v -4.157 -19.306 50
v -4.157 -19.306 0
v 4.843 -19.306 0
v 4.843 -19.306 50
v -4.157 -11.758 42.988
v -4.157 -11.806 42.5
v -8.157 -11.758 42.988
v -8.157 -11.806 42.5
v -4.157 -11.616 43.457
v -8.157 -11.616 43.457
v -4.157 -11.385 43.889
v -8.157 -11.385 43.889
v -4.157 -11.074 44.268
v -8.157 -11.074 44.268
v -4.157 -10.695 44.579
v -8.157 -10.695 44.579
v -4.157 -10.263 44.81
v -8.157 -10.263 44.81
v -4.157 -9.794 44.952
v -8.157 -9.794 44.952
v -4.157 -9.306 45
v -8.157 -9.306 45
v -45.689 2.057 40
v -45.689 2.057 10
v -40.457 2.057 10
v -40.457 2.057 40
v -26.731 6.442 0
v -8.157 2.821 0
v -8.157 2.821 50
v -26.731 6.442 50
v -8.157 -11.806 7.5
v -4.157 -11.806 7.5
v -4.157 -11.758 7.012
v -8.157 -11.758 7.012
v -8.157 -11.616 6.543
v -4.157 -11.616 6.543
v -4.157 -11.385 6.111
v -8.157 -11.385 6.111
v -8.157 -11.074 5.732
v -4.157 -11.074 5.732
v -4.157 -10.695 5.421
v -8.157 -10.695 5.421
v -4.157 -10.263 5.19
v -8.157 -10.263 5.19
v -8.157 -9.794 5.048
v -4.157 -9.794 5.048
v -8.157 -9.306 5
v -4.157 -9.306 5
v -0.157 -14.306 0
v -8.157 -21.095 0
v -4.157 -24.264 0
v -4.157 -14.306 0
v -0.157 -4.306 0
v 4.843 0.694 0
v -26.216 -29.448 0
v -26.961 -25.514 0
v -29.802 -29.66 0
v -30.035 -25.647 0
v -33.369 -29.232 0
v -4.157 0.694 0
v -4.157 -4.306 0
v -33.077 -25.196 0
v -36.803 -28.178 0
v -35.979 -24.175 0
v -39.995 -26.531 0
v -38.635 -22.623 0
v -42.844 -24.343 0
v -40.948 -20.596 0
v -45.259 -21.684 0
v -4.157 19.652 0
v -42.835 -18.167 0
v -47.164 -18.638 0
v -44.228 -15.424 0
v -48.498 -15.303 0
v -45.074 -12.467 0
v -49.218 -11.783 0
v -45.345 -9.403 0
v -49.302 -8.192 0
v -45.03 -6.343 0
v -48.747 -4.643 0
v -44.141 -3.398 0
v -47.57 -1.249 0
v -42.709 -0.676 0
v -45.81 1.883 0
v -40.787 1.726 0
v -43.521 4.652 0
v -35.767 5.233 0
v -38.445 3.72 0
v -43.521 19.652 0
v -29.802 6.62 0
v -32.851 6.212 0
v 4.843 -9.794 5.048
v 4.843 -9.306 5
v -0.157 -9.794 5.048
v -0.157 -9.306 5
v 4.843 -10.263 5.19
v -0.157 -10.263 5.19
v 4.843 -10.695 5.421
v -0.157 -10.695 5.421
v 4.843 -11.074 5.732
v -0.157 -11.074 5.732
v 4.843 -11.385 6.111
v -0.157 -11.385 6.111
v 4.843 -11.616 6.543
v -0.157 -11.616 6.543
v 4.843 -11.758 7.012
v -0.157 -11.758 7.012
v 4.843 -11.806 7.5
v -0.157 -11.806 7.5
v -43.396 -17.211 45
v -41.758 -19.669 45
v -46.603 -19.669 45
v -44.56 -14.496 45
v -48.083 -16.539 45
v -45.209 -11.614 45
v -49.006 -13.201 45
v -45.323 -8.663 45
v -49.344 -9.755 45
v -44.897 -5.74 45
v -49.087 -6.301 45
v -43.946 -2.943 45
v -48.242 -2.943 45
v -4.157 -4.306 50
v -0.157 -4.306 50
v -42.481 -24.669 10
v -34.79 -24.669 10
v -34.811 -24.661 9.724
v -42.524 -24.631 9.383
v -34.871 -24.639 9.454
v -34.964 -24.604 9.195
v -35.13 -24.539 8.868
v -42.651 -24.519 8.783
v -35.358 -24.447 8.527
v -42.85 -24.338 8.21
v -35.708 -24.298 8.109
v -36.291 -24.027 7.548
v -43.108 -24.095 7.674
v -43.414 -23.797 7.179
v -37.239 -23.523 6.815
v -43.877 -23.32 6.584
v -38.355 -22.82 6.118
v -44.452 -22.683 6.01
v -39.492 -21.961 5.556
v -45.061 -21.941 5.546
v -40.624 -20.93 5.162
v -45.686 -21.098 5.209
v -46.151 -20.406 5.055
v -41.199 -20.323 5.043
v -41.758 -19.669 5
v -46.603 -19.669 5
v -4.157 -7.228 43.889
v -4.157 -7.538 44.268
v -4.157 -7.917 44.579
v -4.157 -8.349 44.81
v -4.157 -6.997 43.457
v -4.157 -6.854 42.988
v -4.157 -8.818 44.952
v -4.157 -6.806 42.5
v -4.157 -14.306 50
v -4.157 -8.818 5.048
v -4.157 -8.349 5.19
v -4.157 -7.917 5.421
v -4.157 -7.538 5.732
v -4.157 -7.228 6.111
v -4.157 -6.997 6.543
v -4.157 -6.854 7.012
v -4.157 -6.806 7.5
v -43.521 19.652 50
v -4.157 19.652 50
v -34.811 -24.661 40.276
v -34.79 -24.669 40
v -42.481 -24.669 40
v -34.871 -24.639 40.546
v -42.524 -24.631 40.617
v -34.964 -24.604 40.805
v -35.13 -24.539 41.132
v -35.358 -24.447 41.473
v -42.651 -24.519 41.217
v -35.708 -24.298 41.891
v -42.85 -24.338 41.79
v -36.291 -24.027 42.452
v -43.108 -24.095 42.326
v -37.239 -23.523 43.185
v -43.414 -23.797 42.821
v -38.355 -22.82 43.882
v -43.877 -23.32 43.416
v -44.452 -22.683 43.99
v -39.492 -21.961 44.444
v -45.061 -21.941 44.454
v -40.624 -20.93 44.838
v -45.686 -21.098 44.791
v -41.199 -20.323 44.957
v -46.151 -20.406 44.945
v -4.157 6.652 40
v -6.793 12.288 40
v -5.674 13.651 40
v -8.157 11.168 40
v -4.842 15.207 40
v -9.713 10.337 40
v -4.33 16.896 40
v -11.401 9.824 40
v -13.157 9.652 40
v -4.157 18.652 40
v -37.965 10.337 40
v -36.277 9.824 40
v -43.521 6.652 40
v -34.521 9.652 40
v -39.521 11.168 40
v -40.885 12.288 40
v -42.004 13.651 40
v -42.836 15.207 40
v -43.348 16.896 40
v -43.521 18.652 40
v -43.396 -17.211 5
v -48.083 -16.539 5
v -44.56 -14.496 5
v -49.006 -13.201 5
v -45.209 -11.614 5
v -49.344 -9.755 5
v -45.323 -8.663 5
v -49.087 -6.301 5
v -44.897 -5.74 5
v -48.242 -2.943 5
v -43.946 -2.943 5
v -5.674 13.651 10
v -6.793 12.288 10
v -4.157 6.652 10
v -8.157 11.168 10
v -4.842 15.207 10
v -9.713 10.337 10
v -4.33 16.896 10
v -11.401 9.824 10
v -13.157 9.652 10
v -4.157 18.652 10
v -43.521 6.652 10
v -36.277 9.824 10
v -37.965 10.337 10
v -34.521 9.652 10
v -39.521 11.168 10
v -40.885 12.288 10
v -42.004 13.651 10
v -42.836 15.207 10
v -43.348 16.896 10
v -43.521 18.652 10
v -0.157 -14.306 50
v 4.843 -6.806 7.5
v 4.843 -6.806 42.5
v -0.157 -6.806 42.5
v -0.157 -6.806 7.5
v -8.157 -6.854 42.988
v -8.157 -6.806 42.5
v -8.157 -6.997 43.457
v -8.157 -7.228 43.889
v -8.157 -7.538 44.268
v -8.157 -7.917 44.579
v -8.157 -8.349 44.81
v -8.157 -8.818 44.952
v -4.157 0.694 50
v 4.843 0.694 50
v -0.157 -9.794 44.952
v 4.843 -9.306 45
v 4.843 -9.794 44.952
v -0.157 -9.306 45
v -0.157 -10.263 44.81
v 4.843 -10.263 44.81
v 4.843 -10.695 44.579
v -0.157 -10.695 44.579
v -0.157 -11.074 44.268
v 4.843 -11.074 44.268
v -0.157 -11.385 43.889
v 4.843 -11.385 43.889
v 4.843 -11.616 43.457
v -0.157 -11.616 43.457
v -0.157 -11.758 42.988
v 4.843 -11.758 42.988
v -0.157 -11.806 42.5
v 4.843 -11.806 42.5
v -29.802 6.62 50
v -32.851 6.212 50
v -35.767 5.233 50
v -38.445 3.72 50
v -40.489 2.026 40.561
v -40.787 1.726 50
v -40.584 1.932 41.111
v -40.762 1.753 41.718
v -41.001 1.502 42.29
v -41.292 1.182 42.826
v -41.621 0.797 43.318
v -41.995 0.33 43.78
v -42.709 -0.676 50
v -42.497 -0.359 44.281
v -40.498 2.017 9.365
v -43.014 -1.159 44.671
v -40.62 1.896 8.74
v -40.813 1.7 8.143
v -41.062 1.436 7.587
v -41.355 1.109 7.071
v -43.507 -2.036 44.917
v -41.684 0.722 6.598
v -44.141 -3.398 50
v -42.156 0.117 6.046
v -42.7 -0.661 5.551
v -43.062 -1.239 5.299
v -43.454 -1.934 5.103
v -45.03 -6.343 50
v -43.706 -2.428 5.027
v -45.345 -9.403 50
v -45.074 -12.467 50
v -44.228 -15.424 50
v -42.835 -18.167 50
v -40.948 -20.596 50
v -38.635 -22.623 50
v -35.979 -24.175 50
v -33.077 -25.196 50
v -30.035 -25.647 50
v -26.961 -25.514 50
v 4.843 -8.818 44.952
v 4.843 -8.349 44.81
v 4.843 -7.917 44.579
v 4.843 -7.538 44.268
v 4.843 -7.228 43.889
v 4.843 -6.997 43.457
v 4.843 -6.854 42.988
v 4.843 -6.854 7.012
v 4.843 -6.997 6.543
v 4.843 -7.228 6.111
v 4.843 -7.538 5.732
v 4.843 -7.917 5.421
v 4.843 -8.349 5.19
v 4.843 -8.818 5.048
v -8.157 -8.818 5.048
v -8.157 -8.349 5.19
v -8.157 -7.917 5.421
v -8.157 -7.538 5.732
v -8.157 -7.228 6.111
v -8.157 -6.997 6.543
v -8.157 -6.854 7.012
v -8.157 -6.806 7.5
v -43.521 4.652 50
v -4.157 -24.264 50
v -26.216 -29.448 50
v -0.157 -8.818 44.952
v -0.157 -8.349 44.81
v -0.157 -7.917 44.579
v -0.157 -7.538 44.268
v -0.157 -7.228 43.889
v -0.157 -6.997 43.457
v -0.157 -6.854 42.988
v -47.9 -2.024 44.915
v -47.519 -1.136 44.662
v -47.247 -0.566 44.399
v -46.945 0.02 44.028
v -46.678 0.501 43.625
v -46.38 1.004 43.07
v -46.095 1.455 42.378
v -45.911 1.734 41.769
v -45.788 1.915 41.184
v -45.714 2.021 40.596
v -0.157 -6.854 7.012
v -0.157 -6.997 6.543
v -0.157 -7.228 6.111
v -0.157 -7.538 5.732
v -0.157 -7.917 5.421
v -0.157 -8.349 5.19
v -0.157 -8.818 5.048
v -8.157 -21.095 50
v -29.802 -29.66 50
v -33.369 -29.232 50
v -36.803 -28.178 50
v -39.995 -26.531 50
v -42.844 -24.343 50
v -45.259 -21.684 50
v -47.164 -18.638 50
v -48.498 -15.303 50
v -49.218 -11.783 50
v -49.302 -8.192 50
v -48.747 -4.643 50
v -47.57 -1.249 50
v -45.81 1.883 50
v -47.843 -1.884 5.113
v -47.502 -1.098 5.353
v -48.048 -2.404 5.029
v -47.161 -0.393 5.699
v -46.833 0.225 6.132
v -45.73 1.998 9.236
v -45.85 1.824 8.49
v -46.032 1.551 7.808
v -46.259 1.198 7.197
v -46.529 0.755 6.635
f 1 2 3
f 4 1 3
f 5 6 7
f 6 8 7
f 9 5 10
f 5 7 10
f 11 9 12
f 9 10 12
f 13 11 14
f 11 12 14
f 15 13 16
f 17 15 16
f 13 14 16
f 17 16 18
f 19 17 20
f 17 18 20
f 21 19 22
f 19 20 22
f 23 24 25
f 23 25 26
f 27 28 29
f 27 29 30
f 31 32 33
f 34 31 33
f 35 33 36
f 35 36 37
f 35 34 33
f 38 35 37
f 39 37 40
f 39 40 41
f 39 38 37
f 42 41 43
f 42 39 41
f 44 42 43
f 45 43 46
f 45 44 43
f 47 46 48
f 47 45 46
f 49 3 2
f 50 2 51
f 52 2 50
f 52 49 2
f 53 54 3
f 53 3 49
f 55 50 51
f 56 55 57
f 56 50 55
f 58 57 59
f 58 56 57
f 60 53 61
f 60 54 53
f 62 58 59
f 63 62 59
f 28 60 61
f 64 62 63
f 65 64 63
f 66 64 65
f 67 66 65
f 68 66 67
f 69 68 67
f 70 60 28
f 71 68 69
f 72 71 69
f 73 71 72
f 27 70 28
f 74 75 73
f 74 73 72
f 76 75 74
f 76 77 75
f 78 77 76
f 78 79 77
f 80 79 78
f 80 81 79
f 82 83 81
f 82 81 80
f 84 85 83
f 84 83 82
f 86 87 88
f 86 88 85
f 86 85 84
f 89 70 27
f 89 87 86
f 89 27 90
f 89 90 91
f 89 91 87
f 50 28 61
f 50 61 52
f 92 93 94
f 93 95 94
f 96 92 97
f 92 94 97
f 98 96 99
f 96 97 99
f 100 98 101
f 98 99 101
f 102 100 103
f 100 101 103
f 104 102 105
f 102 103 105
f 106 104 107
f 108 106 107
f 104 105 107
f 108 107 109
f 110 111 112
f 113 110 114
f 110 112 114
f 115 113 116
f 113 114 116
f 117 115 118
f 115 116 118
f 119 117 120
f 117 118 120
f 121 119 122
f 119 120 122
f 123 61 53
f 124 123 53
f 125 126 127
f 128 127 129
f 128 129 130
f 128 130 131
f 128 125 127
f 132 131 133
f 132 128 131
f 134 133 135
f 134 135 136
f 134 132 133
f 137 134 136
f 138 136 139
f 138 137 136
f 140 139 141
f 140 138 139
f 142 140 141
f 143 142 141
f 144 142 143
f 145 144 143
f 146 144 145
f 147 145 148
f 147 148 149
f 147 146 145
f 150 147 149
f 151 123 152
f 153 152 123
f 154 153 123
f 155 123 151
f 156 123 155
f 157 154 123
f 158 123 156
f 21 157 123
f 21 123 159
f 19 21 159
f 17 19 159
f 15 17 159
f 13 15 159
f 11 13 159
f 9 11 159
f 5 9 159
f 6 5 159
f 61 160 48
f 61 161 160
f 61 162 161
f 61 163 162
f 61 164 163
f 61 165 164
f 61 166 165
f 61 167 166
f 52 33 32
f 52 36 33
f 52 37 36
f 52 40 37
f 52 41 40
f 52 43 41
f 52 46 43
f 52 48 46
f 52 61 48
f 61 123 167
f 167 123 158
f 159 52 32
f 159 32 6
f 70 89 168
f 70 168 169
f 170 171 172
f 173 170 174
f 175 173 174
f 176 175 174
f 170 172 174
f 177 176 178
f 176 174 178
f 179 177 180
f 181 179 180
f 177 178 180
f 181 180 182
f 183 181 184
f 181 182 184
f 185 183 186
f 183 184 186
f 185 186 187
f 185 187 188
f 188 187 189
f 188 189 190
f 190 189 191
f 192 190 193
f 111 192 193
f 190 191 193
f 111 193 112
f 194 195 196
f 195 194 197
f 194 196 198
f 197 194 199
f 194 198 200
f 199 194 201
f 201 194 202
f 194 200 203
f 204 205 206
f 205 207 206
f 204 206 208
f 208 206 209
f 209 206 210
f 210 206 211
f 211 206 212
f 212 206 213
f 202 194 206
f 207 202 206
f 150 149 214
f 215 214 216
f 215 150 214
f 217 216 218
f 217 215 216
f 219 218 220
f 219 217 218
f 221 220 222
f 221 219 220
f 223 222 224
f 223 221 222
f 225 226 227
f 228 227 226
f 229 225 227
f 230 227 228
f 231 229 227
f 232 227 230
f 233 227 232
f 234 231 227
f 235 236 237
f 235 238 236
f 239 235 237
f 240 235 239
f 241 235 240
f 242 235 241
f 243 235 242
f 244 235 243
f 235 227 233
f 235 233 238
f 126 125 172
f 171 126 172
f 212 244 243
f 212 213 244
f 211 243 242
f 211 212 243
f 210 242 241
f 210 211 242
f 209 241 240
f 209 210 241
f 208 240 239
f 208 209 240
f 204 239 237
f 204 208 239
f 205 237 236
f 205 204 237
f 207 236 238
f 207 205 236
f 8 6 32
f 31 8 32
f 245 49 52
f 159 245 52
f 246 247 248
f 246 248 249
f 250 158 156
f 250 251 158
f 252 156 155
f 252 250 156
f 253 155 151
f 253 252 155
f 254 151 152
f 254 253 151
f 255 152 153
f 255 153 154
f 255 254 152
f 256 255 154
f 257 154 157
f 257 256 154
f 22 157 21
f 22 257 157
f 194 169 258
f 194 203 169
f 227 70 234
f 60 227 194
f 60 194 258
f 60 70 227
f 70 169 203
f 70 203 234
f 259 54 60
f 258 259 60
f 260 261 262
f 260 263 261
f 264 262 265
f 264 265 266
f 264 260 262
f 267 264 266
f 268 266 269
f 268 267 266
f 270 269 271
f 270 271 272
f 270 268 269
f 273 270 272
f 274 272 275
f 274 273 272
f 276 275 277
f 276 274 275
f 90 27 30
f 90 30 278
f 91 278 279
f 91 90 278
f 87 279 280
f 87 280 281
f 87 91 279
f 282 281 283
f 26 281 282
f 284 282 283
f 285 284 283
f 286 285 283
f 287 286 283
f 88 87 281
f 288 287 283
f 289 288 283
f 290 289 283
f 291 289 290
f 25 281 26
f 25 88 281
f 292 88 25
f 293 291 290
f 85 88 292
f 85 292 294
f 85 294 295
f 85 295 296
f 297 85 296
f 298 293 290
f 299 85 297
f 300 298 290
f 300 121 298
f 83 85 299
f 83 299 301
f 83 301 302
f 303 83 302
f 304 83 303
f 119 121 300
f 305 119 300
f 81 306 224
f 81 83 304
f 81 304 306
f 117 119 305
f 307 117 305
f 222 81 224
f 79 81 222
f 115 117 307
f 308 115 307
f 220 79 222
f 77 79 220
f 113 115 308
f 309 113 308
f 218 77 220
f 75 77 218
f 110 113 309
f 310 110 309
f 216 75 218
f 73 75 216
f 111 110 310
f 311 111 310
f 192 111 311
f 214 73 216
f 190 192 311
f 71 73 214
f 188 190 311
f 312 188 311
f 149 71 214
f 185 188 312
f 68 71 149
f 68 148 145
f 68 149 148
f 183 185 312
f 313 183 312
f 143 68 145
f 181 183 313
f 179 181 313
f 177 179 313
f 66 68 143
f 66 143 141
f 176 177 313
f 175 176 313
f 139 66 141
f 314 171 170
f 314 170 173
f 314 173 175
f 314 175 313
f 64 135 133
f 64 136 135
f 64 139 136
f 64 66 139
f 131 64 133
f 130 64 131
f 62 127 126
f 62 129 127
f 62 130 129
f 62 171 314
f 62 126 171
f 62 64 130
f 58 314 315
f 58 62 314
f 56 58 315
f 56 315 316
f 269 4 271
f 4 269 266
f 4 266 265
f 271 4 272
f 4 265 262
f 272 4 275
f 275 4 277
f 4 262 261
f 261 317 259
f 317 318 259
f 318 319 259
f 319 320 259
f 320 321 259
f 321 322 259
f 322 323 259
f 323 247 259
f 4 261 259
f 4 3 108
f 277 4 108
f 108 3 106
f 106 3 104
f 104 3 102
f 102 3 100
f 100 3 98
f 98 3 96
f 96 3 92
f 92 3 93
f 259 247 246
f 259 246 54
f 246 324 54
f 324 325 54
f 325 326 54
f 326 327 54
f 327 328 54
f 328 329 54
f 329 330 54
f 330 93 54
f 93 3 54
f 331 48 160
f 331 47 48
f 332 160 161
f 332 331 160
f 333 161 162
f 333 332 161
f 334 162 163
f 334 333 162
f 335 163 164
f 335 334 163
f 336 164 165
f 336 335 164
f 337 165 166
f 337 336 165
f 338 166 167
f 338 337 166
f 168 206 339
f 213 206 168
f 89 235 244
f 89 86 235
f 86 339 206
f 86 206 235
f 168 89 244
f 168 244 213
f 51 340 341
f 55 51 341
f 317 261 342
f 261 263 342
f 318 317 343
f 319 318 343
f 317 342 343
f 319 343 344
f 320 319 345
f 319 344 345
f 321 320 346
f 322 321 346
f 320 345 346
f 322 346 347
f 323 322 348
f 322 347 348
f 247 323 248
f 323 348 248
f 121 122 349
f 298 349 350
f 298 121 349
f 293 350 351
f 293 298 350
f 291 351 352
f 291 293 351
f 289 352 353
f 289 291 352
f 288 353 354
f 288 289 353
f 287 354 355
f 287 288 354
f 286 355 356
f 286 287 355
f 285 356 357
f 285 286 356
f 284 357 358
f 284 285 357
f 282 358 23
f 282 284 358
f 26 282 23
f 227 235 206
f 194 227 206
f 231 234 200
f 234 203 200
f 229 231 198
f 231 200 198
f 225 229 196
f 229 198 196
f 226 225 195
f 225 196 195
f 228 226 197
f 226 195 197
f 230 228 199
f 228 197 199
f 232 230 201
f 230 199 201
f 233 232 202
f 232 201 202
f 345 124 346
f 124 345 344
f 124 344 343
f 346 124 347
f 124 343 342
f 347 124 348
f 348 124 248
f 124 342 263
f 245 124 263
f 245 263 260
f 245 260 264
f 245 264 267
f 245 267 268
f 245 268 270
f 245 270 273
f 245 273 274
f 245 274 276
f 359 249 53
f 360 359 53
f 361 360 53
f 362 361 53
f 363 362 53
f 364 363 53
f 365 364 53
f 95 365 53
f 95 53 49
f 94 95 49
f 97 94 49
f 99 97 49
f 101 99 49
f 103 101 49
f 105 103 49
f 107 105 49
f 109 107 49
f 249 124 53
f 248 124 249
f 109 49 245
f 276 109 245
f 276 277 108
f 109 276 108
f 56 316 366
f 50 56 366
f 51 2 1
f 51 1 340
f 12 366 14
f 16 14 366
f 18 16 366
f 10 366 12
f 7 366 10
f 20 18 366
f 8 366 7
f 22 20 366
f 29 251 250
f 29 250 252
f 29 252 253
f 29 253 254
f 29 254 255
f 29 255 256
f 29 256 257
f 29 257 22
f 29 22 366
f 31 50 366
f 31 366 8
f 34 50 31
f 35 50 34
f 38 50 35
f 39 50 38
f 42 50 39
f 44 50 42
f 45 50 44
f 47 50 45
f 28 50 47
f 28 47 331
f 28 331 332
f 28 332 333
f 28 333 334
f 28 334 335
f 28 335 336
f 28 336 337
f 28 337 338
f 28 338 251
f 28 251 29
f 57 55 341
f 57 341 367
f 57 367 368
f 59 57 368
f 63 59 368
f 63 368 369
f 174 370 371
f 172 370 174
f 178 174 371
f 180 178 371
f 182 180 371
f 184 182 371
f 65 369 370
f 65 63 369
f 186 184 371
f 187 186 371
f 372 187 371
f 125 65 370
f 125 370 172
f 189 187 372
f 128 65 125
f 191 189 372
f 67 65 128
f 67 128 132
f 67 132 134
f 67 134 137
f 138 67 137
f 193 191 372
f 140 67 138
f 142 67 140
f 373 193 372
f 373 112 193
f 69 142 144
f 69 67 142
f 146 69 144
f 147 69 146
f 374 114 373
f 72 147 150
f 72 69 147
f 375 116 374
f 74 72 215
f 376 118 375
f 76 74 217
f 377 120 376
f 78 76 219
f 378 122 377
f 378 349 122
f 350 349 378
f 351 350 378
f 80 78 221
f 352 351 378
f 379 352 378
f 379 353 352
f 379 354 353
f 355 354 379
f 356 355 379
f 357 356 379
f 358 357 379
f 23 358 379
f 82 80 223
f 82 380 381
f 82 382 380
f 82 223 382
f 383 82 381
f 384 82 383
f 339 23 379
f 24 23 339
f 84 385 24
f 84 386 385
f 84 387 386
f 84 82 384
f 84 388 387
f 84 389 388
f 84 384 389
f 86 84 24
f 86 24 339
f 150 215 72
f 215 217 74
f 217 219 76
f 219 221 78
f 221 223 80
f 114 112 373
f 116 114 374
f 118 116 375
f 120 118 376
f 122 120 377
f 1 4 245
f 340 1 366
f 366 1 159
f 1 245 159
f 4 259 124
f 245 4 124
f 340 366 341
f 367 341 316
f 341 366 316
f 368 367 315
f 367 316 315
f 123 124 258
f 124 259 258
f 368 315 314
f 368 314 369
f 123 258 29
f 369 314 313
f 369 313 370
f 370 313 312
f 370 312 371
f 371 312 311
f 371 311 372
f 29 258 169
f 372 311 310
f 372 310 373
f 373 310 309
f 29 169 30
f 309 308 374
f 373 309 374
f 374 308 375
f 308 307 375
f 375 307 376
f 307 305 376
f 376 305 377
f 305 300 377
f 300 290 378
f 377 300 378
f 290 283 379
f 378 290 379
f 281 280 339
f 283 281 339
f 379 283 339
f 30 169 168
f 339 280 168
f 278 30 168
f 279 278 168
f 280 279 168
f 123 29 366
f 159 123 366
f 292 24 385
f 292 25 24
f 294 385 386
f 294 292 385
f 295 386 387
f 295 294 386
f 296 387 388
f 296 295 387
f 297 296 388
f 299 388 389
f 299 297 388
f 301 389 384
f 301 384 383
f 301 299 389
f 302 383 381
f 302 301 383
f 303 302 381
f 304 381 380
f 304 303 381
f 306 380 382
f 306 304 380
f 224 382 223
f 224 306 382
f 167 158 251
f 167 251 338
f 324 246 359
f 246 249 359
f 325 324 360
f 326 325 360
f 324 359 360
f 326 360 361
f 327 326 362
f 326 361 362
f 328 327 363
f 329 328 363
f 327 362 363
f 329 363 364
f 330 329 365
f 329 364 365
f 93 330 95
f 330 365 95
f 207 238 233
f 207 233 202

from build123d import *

# Parameters (mm, degrees)
SALIENTE_EXTRUIR1_DEPTH = 50
SALIENTE_EXTRUIR2_DEPTH = 50
CORTAR_EXTRUIR12_REACH  = 81.477
CROQUIS12_W             = 40
CROQUIS12_H             = 5
REDONDEO1_R             = 2.5
CROQUIS16_W             = 40
CROQUIS16_H             = 26.726230184
CORTAR_EXTRUIR17_DEPTH  = 20
REDONDEO2_R             = 5
CORTAR_EXTRUIR18_REACH  = 77.626
CROQUIS21_W             = 30
CROQUIS21_H             = 3
REDONDEO3_R             = 9


with BuildPart() as part:
    # Croquis3 → Saliente-Extruir1 (new body)
    with BuildSketch(Plane.XY):
        with BuildLine():
            Line((-4.157247249, -24.2640649), (-26.215773458, -29.447511872))
            ThreePointArc((-26.215773458, -29.447511872), (-47.164183017, -18.638090647), (-43.521067646, 4.65154569))
            Line((-43.521067646, 4.65154569), (-43.521067646, 19.65154569))
            Line((-43.521067646, 19.65154569), (-4.157247249, 19.65154569))
            Line((-4.157247249, 19.65154569), (-4.157247249, -24.2640649))
        make_face()
        with BuildLine():
            Line((-8.157247249, 2.82108494), (-26.731262437, 6.441781026))
            ThreePointArc((-26.731262437, 6.441781026), (-45.345288804, -9.402744466), (-26.961453667, -25.513783269))
            Line((-26.961453667, -25.513783269), (-8.157247249, -21.095056202))
            Line((-8.157247249, -21.095056202), (-8.157247249, 2.82108494))
        make_face(mode=Mode.SUBTRACT)
    extrude(amount=SALIENTE_EXTRUIR1_DEPTH)

    # Croquis11 → Saliente-Extruir2 (add)
    with BuildSketch(Plane(origin=(0, 0, 0), x_dir=(-1, 0, 0), z_dir=(0, 0, -1))):
        Polygon((-4.842752751, -19.306259605), (-4.842752751, 0.693740395), (4.157247249, 0.693740395), (4.157247249, -4.306259605), (0.157247249, -4.306259605), (0.157247249, -14.306259605), (4.157247249, -14.306259605), (4.157247249, -19.306259605), align=None)
    extrude(amount=-SALIENTE_EXTRUIR2_DEPTH)

    # Cortar-Extruir12: up to this face of the body (flat: up to its plane)
    cortar_extruir12_end = Plane(part.part.faces().sort_by_distance((-8.157247249, -9.136985631, 25))[0])
    # Croquis12 → Cortar-Extruir12 (cut, up to the picked face)
    with BuildSketch(Plane(origin=(4.842752751, 0, 0), x_dir=(0, 0, -1), z_dir=(1, 0, 0)), mode=Mode.PRIVATE) as cortar_extruir12_sk1:
        with Locations((-25, -9.306259605)):
            Rectangle(CROQUIS12_W, CROQUIS12_H)
    cortar_extruir12_tool1 = split(extrude(cortar_extruir12_sk1.sketch, amount=-CORTAR_EXTRUIR12_REACH, mode=Mode.PRIVATE), bisect_by=cortar_extruir12_end, keep=Keep.BOTH, mode=Mode.PRIVATE)
    add(cortar_extruir12_tool1.solids().sort_by(Axis((4.842753, -9.30626, 25), (-1, 0, 0)))[0], mode=Mode.SUBTRACT)

    # Redondeo1
    redondeo1_edges = [part.edges().sort_by_distance(p)[0] for p in [
        (2.342752751, -6.806259605, 5),
        (2.342752751, -6.806259605, 45),
        (-6.157247249, -11.806259605, 5),
        (-6.157247249, -6.806259605, 5),
        (-6.157247249, -11.806259605, 45),
        (-6.157247249, -6.806259605, 45),
        (2.342752751, -11.806259605, 5),
        (2.342752751, -11.806259605, 45),
    ]]
    fillet(redondeo1_edges, radius=REDONDEO1_R - 0.0001)  # a hair under: the kernel refuses the full size

    # Croquis16 → Cortar-Extruir17 (cut, symmetric)
    with BuildSketch(Plane.ZY.offset(48.157247249)):
        with Locations((25, -11.305962539)):
            Rectangle(CROQUIS16_W, CROQUIS16_H)
    extrude(amount=CORTAR_EXTRUIR17_DEPTH, both=True, mode=Mode.SUBTRACT)

    # Redondeo2
    redondeo2_edges = [part.edges().sort_by_distance(p)[0] for p in [
        (-43.072694771, 2.057152553, 45),
        (-38.635693074, -24.669077631, 45),
        (-38.635693074, -24.669077631, 5),
        (-43.072694771, 2.057152553, 5),
    ]]
    fillet(redondeo2_edges, radius=REDONDEO2_R)

    # Croquis21 → Cortar-Extruir18 (cut, up to next)
    with BuildSketch(Plane.ZY.offset(43.521067646), mode=Mode.PRIVATE) as cortar_extruir18_sk1:
        with Locations((25, 8.15154569)):
            Rectangle(CROQUIS21_W, CROQUIS21_H)
    cortar_extruir18_tool1 = extrude(cortar_extruir18_sk1.sketch, amount=-CORTAR_EXTRUIR18_REACH, mode=Mode.PRIVATE) & part.part
    add(cortar_extruir18_tool1.solids().sort_by_distance((-43.521068, 8.151546, 25))[0], mode=Mode.SUBTRACT)

    # Redondeo3
    redondeo3_edges = [part.edges().sort_by_distance(p)[0] for p in [
        (-43.521067646, 9.65154569, 25),
        (-4.157247249, 9.65154569, 25),
    ]]
    fillet(redondeo3_edges, radius=REDONDEO3_R)


solid = part.part
